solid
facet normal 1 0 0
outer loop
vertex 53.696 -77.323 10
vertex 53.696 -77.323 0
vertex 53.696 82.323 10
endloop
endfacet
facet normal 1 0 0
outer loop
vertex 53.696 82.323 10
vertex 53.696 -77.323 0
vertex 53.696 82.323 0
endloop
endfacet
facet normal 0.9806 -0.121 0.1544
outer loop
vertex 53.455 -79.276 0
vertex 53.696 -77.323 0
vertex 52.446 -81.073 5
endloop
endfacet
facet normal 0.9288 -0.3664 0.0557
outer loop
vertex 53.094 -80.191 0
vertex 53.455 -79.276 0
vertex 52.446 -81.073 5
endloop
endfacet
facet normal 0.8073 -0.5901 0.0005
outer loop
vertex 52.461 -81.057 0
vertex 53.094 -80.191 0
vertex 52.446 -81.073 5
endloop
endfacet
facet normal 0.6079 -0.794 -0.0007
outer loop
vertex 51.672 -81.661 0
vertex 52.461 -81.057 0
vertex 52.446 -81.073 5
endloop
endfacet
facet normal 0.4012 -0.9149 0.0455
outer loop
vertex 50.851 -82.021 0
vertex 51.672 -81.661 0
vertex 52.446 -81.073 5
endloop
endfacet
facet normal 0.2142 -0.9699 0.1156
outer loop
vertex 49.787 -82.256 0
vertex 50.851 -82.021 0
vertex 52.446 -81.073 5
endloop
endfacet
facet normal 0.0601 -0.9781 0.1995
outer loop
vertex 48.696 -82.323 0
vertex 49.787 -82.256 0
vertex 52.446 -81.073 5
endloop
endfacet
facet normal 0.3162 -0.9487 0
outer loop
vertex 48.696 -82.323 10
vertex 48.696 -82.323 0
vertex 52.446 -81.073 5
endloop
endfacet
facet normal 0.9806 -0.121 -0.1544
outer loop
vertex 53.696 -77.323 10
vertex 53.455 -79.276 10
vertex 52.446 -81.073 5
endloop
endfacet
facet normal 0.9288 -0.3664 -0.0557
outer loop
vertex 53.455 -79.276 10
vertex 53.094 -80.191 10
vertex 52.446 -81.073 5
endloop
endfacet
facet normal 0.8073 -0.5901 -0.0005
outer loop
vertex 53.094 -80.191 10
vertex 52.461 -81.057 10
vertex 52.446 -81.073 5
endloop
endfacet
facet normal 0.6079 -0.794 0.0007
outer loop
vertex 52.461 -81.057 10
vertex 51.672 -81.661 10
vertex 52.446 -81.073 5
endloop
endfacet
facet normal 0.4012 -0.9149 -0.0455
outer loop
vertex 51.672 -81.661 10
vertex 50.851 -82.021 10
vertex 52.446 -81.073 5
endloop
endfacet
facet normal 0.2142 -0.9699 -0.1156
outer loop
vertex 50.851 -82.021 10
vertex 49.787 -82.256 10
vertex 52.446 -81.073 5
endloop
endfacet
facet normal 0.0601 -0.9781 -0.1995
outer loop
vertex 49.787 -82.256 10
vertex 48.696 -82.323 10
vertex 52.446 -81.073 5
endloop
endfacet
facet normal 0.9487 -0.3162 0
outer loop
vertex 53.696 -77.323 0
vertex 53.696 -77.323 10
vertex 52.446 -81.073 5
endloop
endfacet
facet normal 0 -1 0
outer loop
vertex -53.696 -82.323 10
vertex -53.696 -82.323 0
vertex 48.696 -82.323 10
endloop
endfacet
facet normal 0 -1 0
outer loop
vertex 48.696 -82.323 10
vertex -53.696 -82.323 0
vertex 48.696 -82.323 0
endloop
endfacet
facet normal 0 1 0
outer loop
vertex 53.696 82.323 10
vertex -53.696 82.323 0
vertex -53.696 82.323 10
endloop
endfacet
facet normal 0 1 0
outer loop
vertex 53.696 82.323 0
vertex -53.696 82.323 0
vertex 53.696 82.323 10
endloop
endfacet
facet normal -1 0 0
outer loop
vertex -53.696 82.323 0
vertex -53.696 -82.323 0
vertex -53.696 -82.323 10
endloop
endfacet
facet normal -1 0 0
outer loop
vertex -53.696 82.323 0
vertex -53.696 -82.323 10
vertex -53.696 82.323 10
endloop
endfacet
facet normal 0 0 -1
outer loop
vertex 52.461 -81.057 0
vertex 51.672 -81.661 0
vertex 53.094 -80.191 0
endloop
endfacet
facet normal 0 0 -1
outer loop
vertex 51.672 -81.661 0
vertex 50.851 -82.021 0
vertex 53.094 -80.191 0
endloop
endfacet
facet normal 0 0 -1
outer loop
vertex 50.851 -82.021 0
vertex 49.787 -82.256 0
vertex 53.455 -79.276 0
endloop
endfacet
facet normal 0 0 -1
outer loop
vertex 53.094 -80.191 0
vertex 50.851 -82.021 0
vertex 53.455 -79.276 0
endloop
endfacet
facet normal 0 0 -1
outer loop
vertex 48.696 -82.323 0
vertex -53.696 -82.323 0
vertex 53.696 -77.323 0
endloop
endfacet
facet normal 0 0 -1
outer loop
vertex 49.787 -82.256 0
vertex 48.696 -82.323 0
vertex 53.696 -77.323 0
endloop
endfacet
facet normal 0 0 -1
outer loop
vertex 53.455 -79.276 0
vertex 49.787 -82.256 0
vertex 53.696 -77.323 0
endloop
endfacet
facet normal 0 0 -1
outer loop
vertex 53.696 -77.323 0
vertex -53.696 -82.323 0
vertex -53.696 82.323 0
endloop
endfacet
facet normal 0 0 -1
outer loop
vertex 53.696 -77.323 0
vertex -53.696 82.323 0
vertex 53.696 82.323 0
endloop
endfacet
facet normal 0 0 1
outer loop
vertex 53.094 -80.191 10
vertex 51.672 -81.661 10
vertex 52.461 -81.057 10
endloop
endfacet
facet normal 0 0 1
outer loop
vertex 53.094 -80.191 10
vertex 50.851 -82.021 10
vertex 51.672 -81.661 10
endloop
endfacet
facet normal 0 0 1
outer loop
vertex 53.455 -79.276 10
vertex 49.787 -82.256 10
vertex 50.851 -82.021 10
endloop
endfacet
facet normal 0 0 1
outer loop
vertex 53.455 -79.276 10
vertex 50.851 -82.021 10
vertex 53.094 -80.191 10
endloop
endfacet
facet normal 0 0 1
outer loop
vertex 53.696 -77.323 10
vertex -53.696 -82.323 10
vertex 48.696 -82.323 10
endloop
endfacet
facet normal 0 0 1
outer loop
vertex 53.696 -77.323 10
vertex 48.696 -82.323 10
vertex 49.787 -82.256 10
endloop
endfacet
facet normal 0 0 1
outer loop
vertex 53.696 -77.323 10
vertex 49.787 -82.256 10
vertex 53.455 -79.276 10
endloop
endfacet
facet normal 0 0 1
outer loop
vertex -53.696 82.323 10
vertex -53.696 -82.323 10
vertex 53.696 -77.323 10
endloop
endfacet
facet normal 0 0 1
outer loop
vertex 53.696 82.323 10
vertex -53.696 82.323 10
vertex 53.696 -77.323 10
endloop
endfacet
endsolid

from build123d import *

# Parameters (mm, degrees)
F0_W        = 107.392013073
F0_H        = 164.6451950073
F1_DEPTH    = 10
F2_T1_DEPTH = 35


# Not quite as in the source:
# - a fillet or chamfer that OpenCascade refuses, or shapes differently, is made with other operations: its cross-section is extruded or revolved along the edge and cut away or added


with BuildPart() as f1:
    # F0 (on Top) → F1 (new body)
    with BuildSketch(Plane.XY):
        Rectangle(F0_W, F0_H)
    extrude(amount=F1_DEPTH)

    # F2: fillet of radius 5 on 1 edges, made by hand

    # F2_s2 → F2_t1 (cut)
    with BuildSketch(Plane.XY.offset(-12.5)):
        with BuildLine():
            add(Edge.make_bspline(
                [(48.6960065365, -82.3225975037), (53.6960065365, -82.3225975037), (53.6960065365, -77.3225975037)],
                knots=[0, 0, 0, 1, 1, 1], degree=2, weights=[1, 1, 1]))
            Line((53.6960065365, -77.3225975037), (53.6960065365, -82.3225975037))
            Line((53.6960065365, -82.3225975037), (48.6960065365, -82.3225975037))
        make_face()
    extrude(amount=F2_T1_DEPTH, mode=Mode.SUBTRACT)


solid = f1.part
